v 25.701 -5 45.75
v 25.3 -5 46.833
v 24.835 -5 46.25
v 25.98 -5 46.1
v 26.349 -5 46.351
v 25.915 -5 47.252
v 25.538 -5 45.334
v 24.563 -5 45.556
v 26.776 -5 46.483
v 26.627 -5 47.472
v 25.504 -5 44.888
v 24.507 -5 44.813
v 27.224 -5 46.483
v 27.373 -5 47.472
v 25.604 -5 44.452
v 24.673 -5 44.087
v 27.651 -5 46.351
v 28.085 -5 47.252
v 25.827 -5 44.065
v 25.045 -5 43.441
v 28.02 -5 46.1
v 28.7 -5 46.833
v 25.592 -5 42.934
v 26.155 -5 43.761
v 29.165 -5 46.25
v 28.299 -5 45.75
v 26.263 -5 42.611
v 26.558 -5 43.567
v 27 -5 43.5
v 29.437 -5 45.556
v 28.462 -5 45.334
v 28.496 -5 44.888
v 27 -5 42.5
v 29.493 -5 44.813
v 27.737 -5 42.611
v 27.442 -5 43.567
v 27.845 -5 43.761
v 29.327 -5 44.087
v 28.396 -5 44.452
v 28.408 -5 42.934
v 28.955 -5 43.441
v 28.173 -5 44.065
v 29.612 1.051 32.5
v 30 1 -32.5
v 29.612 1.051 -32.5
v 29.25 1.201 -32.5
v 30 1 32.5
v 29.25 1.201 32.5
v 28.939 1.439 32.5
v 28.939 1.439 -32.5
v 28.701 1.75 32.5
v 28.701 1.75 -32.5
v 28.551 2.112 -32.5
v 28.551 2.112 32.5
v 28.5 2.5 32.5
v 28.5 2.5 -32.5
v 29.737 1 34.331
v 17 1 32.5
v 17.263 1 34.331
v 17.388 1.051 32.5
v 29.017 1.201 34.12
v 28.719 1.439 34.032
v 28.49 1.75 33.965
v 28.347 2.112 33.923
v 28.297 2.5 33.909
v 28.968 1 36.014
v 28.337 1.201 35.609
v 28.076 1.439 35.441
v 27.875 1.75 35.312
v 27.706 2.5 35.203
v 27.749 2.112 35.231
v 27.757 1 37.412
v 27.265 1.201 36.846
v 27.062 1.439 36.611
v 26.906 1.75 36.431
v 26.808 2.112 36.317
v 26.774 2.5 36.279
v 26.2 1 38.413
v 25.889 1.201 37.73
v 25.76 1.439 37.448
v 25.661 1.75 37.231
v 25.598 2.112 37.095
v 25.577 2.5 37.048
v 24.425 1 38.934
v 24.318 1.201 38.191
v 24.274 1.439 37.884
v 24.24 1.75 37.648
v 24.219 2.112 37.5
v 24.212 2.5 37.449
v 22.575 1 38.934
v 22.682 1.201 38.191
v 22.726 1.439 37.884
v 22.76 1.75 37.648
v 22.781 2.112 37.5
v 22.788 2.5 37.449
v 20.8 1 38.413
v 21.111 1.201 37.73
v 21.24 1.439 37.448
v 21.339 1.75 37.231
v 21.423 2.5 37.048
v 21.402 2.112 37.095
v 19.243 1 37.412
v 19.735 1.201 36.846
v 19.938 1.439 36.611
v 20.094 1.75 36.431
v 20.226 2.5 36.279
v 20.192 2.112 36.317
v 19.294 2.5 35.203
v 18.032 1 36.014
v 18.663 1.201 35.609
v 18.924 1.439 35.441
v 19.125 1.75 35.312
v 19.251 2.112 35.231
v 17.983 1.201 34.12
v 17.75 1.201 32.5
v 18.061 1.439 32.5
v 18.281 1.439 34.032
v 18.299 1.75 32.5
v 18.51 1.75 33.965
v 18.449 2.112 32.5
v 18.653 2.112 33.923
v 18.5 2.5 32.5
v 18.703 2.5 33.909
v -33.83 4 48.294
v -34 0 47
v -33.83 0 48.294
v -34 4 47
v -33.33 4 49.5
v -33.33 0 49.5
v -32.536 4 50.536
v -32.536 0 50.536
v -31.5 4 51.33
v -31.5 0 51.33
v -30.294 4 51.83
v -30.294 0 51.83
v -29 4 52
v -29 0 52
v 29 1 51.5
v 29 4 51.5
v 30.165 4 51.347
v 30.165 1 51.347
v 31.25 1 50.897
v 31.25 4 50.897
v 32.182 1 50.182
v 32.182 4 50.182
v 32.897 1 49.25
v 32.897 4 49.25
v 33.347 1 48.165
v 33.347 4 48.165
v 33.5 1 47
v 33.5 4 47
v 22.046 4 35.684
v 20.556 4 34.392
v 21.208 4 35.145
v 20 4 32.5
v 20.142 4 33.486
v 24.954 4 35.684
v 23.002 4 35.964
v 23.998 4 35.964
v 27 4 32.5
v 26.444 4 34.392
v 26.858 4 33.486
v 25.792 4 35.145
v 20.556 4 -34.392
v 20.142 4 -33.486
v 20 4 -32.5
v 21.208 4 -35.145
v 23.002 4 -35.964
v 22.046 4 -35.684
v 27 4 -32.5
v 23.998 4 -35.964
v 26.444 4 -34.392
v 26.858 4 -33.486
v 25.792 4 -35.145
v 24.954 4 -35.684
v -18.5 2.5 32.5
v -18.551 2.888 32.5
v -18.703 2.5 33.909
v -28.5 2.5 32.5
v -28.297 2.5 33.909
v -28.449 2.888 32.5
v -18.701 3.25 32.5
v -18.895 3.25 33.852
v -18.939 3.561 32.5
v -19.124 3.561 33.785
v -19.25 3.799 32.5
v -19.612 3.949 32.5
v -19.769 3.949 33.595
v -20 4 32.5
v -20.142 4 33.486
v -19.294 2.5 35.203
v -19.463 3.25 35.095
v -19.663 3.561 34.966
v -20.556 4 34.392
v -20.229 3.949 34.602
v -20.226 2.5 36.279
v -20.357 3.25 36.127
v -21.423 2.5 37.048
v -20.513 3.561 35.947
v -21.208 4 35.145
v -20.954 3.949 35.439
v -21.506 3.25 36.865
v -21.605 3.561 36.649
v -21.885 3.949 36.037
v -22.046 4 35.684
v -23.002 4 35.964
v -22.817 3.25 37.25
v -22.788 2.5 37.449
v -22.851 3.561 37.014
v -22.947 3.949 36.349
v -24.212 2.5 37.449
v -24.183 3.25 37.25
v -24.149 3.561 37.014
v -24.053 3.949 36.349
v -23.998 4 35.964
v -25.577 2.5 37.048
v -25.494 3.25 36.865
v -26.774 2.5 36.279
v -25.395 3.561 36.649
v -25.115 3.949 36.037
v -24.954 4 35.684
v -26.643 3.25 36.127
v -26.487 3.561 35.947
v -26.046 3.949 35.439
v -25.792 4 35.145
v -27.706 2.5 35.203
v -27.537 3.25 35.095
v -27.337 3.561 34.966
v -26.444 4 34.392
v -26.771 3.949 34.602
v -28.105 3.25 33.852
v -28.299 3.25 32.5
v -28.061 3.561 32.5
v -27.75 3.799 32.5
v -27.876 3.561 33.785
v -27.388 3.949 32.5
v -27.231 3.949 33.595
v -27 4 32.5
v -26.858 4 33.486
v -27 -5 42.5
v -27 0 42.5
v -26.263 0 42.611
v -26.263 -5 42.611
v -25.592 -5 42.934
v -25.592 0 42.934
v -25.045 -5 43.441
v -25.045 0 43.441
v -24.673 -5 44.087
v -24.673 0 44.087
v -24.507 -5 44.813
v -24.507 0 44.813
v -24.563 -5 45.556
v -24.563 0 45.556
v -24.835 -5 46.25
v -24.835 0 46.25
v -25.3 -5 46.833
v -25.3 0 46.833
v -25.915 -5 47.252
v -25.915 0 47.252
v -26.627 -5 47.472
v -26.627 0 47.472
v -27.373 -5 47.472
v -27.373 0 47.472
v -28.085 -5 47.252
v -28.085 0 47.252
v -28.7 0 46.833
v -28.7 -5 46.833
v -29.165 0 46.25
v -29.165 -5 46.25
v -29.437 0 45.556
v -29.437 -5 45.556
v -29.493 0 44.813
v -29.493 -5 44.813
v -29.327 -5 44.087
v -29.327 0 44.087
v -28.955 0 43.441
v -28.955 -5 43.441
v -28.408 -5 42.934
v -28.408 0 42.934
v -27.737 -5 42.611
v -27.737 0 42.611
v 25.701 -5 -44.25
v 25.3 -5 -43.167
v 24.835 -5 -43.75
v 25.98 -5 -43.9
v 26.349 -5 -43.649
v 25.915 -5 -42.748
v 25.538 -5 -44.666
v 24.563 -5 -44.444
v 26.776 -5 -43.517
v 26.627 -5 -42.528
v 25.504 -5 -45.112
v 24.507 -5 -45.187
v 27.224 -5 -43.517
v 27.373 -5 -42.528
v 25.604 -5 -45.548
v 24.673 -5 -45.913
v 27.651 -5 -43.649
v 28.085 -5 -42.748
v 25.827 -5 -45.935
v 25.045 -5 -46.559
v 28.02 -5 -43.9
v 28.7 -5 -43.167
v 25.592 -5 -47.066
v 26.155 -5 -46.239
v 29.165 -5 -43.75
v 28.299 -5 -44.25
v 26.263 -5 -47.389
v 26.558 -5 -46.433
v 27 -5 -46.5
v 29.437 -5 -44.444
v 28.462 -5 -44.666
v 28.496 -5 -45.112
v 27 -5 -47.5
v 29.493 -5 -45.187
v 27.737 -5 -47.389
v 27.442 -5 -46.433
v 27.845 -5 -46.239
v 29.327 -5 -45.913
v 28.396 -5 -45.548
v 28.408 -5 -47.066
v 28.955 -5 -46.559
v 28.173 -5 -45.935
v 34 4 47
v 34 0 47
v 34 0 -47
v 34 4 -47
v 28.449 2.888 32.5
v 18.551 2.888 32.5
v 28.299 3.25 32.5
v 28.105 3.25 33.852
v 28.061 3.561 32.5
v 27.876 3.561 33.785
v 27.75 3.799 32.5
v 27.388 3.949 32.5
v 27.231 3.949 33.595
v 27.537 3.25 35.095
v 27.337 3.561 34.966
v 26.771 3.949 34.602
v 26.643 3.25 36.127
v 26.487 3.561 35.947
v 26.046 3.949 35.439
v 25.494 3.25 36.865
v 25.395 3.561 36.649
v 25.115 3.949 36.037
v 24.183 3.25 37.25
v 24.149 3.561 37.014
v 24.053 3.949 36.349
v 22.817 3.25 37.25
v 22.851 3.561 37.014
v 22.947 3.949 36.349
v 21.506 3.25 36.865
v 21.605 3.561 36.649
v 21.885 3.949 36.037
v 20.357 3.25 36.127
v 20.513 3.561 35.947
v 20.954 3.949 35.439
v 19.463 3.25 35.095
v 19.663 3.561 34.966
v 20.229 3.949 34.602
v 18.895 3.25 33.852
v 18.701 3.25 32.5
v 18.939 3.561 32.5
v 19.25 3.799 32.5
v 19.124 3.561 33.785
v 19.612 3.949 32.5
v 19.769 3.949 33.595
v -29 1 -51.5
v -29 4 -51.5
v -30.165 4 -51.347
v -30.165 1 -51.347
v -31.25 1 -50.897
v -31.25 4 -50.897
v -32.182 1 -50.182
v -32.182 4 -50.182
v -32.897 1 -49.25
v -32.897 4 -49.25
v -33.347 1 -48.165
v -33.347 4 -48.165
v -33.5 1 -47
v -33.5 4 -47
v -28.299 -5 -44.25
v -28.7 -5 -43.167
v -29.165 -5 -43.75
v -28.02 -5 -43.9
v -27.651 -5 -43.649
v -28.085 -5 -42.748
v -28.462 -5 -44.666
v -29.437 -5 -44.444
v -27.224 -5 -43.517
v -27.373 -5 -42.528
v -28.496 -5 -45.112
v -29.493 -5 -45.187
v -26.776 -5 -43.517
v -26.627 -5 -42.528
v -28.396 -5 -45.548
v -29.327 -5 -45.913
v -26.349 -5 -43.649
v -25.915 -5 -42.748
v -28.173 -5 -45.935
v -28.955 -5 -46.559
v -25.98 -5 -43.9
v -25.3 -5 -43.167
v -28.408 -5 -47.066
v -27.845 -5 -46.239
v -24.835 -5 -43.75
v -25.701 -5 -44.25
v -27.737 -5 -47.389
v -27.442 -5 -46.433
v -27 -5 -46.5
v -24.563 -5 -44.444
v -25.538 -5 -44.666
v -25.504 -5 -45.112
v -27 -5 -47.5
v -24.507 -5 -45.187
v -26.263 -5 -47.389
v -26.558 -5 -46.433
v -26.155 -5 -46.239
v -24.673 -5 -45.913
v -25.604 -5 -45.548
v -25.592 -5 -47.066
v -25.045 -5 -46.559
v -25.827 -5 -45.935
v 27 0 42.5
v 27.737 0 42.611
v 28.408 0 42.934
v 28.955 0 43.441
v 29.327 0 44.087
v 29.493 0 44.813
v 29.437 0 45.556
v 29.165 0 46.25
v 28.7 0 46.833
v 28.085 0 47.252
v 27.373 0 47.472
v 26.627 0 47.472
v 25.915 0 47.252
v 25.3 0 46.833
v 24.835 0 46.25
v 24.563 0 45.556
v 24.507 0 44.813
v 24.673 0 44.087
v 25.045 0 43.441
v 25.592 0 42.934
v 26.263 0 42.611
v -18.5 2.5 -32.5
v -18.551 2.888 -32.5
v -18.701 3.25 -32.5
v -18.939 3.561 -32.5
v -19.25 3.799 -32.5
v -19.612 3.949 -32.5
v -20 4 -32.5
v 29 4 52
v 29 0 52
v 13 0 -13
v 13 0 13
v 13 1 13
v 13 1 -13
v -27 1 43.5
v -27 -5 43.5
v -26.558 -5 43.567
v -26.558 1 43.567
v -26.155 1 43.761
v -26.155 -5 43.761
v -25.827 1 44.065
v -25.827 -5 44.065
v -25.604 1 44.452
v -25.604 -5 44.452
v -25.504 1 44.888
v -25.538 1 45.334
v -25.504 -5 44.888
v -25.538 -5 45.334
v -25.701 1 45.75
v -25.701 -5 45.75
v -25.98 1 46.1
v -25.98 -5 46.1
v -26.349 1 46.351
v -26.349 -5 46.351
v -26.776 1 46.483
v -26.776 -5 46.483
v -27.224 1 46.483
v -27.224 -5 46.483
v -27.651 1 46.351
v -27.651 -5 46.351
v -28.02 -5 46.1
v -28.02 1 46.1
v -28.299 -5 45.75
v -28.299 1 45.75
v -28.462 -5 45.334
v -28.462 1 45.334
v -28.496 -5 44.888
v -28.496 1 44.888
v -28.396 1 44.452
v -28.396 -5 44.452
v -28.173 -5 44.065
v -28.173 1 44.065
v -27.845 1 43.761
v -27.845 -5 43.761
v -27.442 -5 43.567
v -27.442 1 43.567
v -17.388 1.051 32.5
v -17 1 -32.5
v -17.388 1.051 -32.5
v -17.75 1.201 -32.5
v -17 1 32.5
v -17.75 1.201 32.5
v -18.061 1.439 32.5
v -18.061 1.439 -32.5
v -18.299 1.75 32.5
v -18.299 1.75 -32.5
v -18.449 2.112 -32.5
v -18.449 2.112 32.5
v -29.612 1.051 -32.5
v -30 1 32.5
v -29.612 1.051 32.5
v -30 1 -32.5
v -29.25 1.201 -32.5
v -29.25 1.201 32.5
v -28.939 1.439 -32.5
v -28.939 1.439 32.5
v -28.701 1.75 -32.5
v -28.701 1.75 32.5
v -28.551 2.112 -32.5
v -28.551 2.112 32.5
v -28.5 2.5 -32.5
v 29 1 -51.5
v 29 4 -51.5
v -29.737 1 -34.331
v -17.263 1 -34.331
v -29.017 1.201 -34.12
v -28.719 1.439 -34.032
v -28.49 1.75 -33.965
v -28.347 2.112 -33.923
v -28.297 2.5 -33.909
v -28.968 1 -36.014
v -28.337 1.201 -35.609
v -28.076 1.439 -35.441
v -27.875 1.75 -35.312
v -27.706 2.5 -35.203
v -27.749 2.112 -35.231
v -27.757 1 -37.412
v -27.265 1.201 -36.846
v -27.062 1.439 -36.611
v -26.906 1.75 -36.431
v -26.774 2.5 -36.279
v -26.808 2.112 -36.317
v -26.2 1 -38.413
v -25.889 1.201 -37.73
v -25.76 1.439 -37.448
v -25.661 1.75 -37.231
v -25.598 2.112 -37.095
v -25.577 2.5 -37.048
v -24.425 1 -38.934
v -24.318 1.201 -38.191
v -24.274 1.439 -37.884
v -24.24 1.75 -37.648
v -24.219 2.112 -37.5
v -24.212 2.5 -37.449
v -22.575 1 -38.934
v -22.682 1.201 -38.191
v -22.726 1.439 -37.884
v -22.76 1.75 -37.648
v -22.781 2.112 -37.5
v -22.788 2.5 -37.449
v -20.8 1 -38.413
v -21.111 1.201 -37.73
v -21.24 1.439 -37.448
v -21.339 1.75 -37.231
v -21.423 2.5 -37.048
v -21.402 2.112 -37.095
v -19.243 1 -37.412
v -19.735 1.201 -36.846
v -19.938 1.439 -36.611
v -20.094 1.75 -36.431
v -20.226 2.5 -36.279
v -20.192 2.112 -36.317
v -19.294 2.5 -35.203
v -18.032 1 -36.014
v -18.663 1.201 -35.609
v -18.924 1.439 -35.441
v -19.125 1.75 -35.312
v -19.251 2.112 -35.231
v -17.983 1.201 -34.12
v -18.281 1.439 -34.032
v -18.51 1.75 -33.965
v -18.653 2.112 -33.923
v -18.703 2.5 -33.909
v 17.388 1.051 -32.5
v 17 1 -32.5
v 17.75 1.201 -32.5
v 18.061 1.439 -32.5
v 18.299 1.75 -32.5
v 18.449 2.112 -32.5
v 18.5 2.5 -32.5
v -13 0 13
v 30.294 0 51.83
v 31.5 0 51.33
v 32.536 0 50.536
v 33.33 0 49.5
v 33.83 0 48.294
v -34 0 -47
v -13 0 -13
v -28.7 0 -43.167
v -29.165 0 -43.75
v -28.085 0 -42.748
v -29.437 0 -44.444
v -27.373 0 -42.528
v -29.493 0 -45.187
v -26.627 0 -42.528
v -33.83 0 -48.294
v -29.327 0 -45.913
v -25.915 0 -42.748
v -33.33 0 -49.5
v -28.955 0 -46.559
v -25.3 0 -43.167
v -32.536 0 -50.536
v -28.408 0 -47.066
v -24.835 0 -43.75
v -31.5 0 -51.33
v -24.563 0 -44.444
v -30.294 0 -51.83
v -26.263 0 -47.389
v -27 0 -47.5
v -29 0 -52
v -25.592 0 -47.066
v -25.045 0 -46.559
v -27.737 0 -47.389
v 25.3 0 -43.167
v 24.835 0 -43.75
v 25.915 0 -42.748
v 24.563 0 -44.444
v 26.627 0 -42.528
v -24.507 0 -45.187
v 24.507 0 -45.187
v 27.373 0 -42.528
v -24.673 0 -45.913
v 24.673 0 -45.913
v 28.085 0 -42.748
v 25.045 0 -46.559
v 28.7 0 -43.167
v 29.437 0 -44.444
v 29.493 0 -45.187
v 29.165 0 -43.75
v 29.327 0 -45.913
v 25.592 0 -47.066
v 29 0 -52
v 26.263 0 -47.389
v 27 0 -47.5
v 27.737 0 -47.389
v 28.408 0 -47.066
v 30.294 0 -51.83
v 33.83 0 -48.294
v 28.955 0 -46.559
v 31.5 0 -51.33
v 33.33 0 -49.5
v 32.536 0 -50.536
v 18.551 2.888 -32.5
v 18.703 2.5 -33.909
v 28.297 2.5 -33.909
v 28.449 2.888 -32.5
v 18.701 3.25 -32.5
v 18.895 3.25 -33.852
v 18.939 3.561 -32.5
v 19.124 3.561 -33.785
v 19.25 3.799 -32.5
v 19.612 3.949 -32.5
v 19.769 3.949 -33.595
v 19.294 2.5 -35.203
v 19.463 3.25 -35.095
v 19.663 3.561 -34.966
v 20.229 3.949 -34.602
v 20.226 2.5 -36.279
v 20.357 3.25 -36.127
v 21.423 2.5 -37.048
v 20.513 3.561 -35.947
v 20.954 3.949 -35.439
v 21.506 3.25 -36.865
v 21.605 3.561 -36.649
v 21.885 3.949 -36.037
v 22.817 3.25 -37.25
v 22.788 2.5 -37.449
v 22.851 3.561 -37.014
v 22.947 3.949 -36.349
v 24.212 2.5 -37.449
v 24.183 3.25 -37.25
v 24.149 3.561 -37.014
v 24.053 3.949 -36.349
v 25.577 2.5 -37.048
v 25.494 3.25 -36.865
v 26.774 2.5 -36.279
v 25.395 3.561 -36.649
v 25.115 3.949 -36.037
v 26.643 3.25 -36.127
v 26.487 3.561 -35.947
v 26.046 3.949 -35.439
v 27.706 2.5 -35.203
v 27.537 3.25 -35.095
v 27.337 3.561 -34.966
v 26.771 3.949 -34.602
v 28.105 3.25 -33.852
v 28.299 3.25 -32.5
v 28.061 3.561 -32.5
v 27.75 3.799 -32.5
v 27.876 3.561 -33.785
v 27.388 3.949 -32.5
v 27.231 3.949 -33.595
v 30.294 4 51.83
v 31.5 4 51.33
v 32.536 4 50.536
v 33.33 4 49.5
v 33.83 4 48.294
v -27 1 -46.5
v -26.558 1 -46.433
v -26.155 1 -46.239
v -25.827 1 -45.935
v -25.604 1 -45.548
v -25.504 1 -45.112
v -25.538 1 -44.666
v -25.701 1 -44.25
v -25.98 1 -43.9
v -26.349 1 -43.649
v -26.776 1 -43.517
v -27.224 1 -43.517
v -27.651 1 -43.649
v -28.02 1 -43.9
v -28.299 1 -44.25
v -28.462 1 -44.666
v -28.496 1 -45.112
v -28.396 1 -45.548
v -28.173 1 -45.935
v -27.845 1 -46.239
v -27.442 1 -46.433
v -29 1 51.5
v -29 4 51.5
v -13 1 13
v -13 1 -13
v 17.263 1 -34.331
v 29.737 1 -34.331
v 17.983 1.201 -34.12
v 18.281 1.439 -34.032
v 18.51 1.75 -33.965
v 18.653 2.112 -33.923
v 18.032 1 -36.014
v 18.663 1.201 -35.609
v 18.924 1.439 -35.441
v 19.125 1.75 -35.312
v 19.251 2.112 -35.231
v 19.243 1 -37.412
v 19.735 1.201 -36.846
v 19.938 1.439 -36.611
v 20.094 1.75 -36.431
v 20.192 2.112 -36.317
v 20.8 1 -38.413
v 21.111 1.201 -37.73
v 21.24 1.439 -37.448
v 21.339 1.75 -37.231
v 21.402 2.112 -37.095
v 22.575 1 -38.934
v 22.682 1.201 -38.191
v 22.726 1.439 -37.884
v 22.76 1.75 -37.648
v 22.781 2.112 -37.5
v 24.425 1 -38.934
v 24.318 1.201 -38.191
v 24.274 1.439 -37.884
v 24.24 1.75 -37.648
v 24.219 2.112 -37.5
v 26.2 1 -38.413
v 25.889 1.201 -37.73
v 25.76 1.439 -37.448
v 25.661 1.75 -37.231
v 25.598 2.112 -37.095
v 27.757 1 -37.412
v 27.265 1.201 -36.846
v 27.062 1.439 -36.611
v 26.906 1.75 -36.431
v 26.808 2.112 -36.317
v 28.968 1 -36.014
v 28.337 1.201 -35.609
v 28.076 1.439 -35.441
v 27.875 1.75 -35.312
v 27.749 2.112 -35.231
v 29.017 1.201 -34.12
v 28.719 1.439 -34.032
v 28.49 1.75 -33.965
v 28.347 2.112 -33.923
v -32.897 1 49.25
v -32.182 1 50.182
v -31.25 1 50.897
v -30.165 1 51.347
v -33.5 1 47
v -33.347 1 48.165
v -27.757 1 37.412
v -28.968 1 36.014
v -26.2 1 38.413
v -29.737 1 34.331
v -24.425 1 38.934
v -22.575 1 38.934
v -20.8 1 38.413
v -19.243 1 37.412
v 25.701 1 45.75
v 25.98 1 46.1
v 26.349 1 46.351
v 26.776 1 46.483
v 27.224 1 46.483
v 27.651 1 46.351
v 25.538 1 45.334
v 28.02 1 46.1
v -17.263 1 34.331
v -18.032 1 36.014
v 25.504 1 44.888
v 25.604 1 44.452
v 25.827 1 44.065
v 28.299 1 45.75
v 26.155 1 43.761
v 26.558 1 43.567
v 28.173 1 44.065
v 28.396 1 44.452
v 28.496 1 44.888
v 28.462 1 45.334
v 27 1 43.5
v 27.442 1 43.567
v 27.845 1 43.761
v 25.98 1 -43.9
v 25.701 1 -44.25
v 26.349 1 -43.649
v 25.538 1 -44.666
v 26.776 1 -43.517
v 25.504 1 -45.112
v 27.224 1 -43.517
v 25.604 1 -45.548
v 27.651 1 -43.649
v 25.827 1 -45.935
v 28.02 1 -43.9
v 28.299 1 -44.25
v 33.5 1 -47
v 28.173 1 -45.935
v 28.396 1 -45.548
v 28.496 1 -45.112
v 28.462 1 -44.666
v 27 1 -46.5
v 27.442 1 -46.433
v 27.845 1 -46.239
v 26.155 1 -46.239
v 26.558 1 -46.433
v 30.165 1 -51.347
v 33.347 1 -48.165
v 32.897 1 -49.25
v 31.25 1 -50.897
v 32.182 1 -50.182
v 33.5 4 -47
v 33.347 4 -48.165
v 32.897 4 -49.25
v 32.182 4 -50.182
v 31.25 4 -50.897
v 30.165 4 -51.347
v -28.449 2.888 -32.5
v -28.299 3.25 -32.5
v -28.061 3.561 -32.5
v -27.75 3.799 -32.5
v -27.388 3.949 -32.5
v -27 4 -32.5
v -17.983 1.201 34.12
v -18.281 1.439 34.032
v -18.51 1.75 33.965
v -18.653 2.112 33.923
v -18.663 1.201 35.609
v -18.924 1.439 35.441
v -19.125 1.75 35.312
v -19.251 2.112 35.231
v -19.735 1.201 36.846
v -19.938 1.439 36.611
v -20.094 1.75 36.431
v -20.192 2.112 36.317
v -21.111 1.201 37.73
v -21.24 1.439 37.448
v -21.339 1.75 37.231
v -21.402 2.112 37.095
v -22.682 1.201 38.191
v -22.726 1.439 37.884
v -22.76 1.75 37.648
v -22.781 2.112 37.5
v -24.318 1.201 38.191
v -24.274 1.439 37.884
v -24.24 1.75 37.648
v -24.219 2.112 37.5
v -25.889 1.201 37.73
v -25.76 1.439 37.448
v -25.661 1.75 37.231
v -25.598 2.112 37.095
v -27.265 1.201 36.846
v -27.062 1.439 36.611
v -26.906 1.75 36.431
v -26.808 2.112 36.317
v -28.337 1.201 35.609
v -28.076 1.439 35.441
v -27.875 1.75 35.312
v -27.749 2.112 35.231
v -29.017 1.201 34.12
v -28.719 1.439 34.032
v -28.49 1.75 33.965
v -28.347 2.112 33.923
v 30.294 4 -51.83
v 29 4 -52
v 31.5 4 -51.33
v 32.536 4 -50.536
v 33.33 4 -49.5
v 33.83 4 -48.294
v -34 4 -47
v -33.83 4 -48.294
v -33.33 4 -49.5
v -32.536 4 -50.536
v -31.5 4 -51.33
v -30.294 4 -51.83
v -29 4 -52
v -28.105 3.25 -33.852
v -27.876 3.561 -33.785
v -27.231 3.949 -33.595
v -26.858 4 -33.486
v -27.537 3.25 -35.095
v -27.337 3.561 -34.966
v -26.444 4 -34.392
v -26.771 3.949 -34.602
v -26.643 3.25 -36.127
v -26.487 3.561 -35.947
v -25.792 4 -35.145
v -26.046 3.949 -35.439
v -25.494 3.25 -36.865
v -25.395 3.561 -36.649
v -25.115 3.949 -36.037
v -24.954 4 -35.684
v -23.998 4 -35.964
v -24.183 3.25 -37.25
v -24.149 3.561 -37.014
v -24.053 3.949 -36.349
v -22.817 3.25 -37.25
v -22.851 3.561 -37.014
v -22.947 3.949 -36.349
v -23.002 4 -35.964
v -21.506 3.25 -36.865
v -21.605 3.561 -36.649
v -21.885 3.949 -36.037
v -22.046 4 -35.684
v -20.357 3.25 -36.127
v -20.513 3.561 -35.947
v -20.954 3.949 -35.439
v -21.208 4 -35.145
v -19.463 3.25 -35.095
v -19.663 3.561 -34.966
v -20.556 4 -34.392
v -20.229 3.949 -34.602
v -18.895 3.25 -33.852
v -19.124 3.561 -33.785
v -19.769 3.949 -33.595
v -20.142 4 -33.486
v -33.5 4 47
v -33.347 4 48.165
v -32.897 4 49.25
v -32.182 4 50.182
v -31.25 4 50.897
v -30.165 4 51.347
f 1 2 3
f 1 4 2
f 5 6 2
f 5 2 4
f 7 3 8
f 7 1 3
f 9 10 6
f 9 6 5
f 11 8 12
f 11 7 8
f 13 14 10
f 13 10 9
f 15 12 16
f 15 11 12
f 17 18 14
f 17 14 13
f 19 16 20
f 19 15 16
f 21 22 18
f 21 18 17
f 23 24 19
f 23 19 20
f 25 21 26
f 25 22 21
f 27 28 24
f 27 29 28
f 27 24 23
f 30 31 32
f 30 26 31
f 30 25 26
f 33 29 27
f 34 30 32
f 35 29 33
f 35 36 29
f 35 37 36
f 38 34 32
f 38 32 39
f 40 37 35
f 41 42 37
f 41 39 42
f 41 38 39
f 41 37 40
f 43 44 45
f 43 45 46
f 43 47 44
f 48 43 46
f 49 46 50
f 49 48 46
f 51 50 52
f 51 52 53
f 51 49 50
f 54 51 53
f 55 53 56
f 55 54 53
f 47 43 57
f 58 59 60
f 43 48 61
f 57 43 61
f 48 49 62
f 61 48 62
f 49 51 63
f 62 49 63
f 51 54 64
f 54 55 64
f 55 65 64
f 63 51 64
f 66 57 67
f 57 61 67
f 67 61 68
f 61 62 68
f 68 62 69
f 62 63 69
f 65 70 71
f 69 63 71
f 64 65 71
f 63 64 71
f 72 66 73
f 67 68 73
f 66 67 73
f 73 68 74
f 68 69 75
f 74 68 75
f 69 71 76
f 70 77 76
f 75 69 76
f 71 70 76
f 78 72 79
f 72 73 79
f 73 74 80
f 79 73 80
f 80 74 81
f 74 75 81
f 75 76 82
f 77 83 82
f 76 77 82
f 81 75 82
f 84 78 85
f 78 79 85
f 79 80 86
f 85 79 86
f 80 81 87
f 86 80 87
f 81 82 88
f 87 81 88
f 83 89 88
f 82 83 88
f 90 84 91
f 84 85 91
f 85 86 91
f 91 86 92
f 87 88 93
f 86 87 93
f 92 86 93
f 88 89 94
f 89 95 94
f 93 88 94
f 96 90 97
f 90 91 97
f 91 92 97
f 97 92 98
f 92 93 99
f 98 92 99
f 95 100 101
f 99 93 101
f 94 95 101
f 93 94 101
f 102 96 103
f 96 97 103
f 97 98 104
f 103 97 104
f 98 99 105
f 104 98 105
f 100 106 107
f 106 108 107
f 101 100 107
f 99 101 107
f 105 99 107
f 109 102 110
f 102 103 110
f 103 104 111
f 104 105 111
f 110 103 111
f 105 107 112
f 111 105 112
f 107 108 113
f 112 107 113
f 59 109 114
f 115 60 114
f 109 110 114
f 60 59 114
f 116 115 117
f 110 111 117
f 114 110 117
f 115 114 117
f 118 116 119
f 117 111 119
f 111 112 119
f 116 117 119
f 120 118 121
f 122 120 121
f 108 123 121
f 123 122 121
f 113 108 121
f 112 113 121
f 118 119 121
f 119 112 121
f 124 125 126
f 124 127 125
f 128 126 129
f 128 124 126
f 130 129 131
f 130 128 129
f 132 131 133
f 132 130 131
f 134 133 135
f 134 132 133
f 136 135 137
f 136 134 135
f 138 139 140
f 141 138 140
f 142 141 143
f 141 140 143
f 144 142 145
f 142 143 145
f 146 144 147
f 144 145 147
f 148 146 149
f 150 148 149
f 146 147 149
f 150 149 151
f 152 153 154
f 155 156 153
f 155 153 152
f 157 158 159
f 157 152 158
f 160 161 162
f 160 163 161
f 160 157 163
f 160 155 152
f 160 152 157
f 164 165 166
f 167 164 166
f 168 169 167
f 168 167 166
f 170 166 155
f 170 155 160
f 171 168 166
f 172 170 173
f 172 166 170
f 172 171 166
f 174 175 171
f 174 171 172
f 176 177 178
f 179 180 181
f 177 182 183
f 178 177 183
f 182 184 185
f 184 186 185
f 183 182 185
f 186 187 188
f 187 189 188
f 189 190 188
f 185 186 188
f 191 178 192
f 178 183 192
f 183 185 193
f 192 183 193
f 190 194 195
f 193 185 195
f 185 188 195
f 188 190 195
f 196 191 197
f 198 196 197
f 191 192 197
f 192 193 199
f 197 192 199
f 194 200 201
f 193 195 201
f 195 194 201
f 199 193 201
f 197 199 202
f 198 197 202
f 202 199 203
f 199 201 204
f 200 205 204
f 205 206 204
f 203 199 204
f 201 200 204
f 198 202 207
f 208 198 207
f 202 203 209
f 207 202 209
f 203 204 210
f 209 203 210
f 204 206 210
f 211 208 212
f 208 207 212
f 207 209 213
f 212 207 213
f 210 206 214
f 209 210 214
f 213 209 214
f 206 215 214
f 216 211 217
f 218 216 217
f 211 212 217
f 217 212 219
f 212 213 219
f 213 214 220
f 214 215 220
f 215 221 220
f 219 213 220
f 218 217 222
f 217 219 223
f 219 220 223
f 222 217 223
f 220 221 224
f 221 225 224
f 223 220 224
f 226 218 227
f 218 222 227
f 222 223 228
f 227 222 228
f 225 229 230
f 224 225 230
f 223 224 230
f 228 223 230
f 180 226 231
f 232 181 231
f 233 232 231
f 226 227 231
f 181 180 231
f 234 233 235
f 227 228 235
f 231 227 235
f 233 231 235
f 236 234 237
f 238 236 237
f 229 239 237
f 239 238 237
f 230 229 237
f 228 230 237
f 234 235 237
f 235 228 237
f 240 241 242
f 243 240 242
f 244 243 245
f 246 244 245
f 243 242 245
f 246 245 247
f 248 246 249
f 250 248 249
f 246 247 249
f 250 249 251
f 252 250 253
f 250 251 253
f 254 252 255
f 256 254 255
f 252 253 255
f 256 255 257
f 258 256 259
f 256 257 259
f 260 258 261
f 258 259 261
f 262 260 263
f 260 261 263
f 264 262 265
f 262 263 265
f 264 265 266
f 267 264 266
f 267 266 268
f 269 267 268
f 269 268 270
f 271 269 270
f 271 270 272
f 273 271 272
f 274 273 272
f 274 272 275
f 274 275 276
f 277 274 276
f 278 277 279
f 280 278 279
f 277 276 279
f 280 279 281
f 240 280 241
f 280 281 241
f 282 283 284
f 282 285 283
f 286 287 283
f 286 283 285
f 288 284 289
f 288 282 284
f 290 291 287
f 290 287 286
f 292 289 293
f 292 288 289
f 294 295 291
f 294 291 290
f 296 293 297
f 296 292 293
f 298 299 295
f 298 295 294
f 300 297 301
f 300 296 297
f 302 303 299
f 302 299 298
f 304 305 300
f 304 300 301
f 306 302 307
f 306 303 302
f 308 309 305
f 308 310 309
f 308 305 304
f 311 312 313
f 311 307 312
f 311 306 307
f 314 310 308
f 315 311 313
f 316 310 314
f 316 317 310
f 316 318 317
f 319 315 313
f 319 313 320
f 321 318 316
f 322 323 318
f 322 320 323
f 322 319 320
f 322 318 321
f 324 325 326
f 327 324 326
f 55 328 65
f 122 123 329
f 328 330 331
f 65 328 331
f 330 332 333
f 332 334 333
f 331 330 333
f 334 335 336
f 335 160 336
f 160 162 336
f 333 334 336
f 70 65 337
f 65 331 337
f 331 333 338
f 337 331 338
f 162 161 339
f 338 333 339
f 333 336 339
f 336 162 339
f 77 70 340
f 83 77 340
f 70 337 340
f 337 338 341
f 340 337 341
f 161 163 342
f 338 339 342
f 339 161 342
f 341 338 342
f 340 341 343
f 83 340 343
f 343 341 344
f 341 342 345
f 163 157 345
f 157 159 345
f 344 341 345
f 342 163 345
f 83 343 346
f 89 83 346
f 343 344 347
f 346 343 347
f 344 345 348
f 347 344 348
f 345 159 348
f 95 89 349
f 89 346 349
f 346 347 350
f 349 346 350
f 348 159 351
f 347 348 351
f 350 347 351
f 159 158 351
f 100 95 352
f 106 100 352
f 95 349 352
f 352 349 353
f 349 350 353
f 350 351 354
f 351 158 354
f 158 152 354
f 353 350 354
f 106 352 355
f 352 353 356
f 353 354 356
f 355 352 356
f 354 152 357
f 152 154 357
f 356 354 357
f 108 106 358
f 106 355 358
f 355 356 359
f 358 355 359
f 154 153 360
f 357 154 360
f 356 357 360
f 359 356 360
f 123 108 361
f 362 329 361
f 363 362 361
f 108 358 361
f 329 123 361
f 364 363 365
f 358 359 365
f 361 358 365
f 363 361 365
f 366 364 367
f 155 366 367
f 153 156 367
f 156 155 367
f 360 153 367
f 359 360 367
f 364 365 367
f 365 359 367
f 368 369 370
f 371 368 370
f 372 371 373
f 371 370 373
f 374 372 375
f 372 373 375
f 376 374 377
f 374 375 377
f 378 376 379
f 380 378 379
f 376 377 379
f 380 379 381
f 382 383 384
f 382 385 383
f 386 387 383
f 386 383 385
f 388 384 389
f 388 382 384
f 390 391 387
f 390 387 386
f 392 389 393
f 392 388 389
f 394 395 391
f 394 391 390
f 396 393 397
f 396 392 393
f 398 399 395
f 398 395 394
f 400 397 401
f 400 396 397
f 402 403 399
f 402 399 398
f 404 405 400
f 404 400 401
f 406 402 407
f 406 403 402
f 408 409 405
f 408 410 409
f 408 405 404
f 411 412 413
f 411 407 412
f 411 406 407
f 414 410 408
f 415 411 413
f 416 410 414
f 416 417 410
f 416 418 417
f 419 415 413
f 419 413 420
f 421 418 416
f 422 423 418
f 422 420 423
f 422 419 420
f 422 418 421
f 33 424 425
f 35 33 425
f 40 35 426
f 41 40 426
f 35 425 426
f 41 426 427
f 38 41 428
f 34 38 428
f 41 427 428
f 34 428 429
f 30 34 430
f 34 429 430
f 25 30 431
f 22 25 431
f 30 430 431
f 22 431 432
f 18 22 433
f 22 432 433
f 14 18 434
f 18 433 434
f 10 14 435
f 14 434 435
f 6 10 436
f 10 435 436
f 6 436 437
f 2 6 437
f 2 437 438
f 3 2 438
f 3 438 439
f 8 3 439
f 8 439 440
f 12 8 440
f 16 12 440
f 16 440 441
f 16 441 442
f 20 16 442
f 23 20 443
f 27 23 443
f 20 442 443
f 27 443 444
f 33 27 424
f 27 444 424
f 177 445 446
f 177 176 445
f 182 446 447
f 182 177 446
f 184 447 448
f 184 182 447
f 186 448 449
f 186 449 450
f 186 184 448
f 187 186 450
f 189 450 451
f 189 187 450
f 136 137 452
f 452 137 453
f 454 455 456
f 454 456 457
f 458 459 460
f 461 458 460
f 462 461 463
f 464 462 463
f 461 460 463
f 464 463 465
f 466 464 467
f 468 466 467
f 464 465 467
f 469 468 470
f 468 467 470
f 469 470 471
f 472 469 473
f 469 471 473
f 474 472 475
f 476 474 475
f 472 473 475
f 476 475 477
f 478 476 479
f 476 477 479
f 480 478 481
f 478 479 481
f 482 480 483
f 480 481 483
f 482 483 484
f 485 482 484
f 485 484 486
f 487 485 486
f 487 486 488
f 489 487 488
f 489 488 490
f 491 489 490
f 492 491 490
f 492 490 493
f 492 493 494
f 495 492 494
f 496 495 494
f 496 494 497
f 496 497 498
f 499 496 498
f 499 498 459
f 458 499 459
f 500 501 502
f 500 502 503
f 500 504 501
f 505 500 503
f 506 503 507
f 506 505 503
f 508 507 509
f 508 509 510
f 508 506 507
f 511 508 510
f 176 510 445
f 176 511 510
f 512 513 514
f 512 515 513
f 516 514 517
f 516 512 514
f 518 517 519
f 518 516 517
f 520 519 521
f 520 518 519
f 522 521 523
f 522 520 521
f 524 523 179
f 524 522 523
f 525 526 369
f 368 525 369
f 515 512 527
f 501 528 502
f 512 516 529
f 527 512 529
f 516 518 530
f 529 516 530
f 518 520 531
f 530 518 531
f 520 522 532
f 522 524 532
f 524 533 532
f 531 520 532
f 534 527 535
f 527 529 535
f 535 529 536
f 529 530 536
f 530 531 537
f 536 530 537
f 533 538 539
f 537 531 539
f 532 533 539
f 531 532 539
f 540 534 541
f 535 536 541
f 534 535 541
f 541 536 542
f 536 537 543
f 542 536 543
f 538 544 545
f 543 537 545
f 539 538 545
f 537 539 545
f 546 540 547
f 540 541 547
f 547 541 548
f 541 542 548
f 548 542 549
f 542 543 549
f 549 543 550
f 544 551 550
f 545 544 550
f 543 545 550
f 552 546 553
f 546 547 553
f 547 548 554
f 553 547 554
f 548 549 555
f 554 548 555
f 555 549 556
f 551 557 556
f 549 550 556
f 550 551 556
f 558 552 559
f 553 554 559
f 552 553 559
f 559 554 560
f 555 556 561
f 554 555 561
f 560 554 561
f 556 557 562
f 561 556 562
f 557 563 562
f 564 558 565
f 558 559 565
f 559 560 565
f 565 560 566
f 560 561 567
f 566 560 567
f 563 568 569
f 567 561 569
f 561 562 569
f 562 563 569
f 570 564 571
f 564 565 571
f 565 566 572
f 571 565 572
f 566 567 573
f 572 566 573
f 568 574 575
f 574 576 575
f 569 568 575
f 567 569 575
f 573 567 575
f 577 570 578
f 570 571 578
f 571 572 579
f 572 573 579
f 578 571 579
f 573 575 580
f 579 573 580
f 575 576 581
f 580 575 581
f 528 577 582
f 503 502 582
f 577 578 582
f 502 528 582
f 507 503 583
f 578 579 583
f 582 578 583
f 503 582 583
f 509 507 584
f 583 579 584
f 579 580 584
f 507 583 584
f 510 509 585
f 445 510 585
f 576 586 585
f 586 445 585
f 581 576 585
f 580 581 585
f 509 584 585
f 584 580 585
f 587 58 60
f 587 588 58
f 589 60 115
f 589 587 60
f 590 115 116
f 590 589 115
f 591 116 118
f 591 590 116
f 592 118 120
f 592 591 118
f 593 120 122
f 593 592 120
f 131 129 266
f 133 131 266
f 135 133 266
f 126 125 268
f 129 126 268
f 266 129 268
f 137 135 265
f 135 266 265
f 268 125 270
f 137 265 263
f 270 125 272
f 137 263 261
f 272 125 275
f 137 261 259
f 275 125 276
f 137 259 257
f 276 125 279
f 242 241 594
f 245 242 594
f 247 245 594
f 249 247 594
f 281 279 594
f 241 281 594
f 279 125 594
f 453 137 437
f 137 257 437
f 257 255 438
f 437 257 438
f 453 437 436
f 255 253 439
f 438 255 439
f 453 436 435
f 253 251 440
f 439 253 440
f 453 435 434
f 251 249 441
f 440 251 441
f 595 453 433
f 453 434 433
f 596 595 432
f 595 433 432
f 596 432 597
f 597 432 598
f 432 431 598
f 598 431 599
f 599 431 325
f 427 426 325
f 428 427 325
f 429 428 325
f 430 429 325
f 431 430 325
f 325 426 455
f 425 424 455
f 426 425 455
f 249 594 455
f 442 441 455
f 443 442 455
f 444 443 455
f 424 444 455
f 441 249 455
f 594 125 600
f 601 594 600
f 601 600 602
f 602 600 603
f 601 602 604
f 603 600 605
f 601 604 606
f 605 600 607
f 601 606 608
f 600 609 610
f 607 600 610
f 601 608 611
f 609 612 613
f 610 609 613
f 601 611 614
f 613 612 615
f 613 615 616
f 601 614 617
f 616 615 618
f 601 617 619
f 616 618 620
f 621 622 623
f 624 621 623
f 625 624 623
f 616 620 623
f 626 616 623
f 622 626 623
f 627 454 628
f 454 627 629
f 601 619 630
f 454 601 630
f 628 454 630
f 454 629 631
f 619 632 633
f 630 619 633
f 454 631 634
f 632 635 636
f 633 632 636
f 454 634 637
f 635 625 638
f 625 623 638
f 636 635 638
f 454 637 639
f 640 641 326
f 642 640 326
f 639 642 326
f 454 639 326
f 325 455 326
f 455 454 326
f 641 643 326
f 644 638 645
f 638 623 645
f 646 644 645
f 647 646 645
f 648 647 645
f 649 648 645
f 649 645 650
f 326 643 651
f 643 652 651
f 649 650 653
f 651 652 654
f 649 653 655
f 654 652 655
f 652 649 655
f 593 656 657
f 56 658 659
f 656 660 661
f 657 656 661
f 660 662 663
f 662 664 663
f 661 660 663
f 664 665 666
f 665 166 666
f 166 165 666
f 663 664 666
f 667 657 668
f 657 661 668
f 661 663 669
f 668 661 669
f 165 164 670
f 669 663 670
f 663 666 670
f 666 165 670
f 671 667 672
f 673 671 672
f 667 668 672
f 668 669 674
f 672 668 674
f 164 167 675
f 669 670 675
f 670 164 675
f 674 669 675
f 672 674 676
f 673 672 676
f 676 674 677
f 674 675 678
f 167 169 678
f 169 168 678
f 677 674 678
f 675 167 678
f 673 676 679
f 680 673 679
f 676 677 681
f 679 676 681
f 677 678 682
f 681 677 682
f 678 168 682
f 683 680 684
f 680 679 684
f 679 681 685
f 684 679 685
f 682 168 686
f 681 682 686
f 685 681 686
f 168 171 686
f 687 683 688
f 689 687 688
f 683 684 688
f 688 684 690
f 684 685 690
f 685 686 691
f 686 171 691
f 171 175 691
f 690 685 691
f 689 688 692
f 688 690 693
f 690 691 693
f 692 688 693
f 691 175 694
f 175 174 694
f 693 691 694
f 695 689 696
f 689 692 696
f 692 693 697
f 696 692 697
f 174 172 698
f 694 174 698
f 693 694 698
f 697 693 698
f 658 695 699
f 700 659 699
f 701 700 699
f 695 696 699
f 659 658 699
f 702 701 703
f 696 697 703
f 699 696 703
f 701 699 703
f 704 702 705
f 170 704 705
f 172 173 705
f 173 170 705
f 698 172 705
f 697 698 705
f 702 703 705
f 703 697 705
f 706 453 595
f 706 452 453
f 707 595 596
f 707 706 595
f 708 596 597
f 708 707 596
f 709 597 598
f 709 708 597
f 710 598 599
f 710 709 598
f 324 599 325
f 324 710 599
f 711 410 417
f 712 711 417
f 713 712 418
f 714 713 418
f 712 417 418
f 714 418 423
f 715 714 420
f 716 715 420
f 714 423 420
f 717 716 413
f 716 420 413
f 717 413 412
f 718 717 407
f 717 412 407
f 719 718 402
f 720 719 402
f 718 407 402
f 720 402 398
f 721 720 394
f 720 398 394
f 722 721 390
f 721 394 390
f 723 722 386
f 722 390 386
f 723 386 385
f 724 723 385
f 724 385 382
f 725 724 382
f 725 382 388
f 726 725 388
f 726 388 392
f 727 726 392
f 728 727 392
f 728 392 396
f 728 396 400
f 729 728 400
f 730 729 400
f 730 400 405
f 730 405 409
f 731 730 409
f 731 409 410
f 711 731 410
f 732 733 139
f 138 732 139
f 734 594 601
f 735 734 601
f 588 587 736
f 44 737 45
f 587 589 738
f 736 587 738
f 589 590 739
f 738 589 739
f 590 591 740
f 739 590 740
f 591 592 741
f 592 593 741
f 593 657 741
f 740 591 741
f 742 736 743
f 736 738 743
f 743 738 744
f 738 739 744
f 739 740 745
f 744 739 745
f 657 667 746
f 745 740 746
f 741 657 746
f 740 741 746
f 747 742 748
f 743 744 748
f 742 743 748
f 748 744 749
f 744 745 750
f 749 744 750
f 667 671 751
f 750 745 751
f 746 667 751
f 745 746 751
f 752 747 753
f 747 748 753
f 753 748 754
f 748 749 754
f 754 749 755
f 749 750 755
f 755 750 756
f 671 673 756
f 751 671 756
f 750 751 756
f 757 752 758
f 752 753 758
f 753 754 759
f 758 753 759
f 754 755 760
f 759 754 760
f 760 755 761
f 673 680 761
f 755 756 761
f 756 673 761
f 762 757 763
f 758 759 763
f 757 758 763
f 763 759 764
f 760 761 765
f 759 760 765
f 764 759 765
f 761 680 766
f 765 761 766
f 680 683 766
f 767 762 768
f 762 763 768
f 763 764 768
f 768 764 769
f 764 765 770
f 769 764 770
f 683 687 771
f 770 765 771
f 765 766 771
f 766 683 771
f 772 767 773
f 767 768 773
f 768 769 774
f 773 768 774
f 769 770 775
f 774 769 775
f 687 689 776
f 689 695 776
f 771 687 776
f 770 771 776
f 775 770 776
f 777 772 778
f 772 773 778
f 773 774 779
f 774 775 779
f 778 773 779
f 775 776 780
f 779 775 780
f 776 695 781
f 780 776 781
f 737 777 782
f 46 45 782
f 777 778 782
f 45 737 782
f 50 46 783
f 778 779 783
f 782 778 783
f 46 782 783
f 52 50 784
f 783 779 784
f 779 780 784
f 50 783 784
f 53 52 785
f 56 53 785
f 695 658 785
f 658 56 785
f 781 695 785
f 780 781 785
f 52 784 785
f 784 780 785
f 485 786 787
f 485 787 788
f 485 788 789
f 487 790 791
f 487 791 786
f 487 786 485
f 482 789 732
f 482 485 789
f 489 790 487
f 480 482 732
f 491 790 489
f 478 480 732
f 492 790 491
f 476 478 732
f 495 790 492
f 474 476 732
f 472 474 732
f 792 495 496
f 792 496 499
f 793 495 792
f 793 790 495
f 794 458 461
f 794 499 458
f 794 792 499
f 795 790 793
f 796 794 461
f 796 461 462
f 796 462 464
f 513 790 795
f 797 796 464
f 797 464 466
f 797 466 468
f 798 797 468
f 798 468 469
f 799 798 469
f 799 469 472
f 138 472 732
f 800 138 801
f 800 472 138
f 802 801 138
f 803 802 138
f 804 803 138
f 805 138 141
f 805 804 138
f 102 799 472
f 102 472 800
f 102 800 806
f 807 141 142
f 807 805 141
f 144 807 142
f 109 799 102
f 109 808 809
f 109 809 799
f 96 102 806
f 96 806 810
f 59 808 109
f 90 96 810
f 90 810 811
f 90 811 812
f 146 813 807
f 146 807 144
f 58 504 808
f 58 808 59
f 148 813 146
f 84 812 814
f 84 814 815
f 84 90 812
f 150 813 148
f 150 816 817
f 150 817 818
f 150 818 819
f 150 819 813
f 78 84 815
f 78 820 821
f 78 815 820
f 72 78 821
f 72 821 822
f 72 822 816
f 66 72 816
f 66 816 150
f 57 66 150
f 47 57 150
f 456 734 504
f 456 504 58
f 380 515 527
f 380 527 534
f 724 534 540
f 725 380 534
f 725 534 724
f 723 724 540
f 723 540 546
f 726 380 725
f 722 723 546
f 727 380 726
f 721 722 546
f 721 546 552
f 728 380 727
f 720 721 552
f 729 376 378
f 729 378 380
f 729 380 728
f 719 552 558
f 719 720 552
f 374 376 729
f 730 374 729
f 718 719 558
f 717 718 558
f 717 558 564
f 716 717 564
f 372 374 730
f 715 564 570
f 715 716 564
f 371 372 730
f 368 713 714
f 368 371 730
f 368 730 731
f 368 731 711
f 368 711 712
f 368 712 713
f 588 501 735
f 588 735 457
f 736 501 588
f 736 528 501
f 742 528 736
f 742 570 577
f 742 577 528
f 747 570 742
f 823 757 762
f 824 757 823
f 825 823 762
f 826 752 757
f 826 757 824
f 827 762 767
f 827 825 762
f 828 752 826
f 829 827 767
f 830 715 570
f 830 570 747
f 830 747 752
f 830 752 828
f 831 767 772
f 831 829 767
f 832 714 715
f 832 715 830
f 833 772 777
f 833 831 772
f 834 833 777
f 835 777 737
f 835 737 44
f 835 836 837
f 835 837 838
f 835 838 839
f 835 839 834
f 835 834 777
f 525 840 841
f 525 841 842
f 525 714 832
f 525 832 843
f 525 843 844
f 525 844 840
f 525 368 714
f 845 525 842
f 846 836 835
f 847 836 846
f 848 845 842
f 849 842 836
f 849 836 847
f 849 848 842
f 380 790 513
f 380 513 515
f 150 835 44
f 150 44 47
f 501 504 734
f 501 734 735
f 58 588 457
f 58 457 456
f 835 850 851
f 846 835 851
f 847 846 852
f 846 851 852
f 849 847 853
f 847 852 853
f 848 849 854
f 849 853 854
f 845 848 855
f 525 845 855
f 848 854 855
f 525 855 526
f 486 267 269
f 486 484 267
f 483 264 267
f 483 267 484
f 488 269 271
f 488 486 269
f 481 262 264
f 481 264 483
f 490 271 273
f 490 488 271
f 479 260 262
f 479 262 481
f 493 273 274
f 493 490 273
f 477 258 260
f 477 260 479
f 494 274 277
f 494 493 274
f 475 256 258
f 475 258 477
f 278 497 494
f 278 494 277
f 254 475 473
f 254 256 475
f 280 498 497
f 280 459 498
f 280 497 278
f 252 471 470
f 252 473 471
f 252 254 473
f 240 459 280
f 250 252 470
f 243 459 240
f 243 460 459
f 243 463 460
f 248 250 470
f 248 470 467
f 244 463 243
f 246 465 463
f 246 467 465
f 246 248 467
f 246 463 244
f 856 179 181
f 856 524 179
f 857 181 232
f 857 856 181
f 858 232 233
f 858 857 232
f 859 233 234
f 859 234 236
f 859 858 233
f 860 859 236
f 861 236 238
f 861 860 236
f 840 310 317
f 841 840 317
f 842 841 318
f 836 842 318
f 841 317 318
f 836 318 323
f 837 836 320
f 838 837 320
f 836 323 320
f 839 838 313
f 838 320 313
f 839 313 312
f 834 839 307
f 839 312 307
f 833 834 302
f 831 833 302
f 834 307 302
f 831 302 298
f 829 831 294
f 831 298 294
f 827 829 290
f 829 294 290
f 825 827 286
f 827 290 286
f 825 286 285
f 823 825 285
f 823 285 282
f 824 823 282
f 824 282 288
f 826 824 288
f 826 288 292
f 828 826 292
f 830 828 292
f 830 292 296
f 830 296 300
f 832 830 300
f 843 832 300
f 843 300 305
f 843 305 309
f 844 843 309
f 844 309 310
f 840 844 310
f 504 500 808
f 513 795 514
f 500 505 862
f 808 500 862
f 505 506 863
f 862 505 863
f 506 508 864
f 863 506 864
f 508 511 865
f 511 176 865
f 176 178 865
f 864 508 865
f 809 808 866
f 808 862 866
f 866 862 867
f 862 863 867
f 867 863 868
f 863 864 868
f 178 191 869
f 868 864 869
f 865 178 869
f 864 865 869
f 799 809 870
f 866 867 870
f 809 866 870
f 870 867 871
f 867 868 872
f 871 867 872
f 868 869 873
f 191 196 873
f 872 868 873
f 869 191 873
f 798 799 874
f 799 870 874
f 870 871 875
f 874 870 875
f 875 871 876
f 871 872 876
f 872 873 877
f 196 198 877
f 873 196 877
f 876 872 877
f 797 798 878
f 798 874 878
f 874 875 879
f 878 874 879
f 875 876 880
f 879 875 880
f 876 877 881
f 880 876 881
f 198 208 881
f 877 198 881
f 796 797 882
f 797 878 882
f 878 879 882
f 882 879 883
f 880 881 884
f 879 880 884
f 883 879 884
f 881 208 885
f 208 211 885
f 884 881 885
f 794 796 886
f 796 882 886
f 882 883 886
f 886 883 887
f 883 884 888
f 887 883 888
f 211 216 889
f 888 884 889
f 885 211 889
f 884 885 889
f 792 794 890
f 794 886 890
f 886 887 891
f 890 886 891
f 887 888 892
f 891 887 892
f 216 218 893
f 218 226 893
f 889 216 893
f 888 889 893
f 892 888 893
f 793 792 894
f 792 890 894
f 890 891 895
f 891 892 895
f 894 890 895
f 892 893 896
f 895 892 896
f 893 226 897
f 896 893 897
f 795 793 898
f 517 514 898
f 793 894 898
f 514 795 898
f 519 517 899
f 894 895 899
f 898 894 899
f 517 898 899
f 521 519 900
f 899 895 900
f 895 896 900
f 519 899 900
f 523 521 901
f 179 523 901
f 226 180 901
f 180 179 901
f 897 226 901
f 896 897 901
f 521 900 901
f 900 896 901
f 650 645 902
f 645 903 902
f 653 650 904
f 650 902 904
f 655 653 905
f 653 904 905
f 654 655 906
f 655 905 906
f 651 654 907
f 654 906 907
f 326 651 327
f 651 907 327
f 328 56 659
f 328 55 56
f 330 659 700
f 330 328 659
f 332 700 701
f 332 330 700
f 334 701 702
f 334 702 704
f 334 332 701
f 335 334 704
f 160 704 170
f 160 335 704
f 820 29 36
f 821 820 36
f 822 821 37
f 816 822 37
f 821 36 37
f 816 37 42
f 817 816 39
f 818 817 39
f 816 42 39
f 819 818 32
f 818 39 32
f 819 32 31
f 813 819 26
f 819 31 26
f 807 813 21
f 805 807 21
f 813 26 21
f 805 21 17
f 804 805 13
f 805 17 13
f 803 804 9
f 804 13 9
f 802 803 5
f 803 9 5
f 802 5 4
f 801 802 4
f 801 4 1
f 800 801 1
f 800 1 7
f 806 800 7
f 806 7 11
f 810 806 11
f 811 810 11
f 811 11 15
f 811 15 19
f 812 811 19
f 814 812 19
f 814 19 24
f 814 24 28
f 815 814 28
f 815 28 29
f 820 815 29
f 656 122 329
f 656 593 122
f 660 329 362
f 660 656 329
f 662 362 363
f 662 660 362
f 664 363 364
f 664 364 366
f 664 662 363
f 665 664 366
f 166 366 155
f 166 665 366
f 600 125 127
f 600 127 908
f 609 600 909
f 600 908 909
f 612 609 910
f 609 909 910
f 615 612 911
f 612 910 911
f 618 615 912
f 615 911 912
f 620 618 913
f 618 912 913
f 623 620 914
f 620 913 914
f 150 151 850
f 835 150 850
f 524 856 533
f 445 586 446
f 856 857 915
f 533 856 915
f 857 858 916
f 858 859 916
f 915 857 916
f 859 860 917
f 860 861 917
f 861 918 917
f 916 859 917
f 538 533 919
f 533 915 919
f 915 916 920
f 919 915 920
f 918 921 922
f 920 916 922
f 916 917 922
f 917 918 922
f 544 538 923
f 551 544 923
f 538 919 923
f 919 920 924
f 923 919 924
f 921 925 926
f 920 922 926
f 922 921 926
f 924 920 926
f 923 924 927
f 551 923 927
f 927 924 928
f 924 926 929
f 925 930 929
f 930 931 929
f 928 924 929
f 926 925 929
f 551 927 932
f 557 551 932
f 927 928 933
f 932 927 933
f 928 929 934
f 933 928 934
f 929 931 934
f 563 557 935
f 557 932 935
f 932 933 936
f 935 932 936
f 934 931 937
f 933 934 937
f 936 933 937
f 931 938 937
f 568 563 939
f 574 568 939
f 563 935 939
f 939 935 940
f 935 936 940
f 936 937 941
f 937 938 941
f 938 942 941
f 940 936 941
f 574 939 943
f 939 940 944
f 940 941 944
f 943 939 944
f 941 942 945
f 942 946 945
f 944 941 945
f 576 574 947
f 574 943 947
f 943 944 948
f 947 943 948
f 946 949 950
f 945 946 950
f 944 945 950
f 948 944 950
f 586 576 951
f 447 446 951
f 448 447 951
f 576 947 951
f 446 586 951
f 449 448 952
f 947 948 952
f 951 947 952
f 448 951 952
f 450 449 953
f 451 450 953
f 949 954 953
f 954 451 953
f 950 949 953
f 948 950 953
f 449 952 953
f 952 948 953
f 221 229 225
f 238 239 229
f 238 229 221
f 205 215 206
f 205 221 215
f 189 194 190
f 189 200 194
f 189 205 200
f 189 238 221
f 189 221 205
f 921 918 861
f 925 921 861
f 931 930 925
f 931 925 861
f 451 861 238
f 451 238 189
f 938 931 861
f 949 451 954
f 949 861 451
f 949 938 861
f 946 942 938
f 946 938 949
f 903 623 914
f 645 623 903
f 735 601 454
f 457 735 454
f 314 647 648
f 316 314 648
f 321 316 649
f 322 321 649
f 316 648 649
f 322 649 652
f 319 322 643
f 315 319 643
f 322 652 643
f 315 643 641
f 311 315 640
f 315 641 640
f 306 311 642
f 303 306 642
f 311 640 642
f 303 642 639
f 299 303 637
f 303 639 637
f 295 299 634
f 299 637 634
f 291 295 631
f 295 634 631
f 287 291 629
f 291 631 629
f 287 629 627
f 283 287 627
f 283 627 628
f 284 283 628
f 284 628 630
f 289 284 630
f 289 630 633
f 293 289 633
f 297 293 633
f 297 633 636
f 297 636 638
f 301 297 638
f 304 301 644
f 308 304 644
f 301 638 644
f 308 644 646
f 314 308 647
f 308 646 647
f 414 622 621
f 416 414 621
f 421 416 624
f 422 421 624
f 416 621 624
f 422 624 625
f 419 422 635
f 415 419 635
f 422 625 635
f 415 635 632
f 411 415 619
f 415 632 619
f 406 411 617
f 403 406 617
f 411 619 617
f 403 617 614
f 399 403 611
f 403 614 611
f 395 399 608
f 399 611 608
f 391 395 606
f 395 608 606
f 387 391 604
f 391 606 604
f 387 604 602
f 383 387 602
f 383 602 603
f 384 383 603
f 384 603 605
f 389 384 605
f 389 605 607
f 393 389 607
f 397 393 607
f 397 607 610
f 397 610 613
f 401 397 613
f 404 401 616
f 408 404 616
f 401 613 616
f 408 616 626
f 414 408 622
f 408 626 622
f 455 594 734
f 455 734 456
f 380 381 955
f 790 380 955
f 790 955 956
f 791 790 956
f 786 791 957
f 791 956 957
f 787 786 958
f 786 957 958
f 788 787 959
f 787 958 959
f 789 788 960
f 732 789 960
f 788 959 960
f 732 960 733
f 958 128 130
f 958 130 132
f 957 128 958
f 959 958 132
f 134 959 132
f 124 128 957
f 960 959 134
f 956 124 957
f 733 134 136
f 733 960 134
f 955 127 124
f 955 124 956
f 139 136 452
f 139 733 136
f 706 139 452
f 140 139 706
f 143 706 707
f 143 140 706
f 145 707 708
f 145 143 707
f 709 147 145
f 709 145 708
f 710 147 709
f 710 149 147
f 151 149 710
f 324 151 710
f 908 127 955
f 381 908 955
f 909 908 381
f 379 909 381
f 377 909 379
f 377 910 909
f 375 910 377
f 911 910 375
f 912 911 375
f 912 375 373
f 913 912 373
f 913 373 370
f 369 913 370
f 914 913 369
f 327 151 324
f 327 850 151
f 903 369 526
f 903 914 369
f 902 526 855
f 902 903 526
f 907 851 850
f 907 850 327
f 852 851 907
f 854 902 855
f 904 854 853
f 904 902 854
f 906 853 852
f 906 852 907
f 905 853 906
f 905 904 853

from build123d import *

# Parameters (mm, degrees)
SKETCH1_W           = 68
SKETCH1_H           = 104
SKETCH1_W_2         = 26
SKETCH1_H_2         = 26
BOSS_EXTRUDE1_DEPTH = 4
FILLET1_R           = 5
CUT_EXTRUDE1_DEPTH  = 3
FILLET2_R           = 1.5
SKETCH4_R           = 2.5
BOSS_EXTRUDE2_DEPTH = 5
SKETCH5_R           = 1.5
CUT_EXTRUDE2_DEPTH  = 63.777384463


with BuildPart() as part:
    # Sketch1 → Boss-Extrude1 (new body)
    with BuildSketch(Plane(origin=(0, 0, 0), x_dir=(1, 0, 0), z_dir=(0, 1, 0))):
        Rectangle(SKETCH1_W, SKETCH1_H)
        Rectangle(SKETCH1_W_2, SKETCH1_H_2, mode=Mode.SUBTRACT)
    extrude(amount=BOSS_EXTRUDE1_DEPTH)

    # Fillet1
    fillet1_edges = [part.edges().sort_by_distance(p)[0] for p in [
        (34, 2, 52),
        (-34, 2, 52),
        (-34, 2, -52),
        (34, 2, -52),
    ]]
    fillet(fillet1_edges, radius=FILLET1_R)

    # Sketch3 → Cut-Extrude1 (cut)
    with BuildSketch(Plane(origin=(0, 4, 0), x_dir=(1, 0, 0), z_dir=(0, 1, 0))):
        with BuildLine():
            Line((29, 51.5), (-29, 51.5))
            ThreePointArc((-29, 51.5), (-32.181980515, 50.181980515), (-33.5, 47))
            Line((-33.5, 47), (-33.5, -47))
            ThreePointArc((-33.5, -47), (-32.181980515, -50.181980515), (-29, -51.5))
            Line((-29, -51.5), (29, -51.5))
            ThreePointArc((29, -51.5), (32.181980515, -50.181980515), (33.5, -47))
            Line((33.5, -47), (33.5, 47))
            ThreePointArc((33.5, 47), (32.181980515, 50.181980515), (29, 51.5))
        make_face()
        with BuildLine():
            Line((-28.5, -32.5), (-28.5, 32.5))
            ThreePointArc((-28.5, 32.5), (-23.5, 37.5), (-18.5, 32.5))
            Line((-18.5, 32.5), (-18.5, -32.5))
            ThreePointArc((-18.5, -32.5), (-23.5, -37.5), (-28.5, -32.5))
        make_face(mode=Mode.SUBTRACT)
        with BuildLine():
            Line((18.5, -32.5), (18.5, 32.5))
            ThreePointArc((18.5, 32.5), (23.5, 37.5), (28.5, 32.5))
            Line((28.5, 32.5), (28.5, -32.5))
            ThreePointArc((28.5, -32.5), (23.5, -37.5), (18.5, -32.5))
        make_face(mode=Mode.SUBTRACT)
    extrude(amount=-CUT_EXTRUDE1_DEPTH, mode=Mode.SUBTRACT)

    # Fillet2
    fillet2_edges = [part.edges().sort_by_distance(p)[0] for p in [
        (23.5, 4, -37.5),
        (28.5, 4, 0),
        (23.5, 4, 37.5),
        (23.5, 1, -37.5),
        (28.5, 1, 0),
        (23.5, 1, 37.5),
        (-23.5, 4, -37.5),
        (-18.5, 4, 0),
        (-23.5, 4, 37.5),
        (-23.5, 1, -37.5),
        (-18.5, 1, 0),
        (-23.5, 1, 37.5),
        (18.5, 4, 0),
        (18.5, 1, 0),
        (-28.5, 4, 0),
        (-28.5, 1, 0),
    ]]
    fillet(fillet2_edges, radius=FILLET2_R - 0.0001)  # a hair under: the kernel refuses the full size

    # Sketch4 → Boss-Extrude2 (add)
    with BuildSketch(Plane.XZ):
        with Locations(Location((-27, 45, 0), (0, 0, 270))):
            Circle(SKETCH4_R)
        with Locations(Location((27, 45, 0), (0, 0, 270))):
            Circle(SKETCH4_R)
        with Locations(Location((27, -45, 0), (0, 0, 270))):
            Circle(SKETCH4_R)
        with Locations(Location((-27, -45, 0), (0, 0, 270))):
            Circle(SKETCH4_R)
    extrude(amount=BOSS_EXTRUDE2_DEPTH)

    # Sketch5 → Cut-Extrude2 (cut, through all)
    with BuildSketch(Plane.XZ.offset(5)):
        with Locations(Location((-27, 45, 0), (0, 0, 270))):
            Circle(SKETCH5_R)
        with Locations(Location((27, 45, 0), (0, 0, 270))):
            Circle(SKETCH5_R)
        with Locations(Location((27, -45, 0), (0, 0, 270))):
            Circle(SKETCH5_R)
        with Locations(Location((-27, -45, 0), (0, 0, 270))):
            Circle(SKETCH5_R)
    extrude(amount=-CUT_EXTRUDE2_DEPTH, mode=Mode.SUBTRACT)


solid = part.part
